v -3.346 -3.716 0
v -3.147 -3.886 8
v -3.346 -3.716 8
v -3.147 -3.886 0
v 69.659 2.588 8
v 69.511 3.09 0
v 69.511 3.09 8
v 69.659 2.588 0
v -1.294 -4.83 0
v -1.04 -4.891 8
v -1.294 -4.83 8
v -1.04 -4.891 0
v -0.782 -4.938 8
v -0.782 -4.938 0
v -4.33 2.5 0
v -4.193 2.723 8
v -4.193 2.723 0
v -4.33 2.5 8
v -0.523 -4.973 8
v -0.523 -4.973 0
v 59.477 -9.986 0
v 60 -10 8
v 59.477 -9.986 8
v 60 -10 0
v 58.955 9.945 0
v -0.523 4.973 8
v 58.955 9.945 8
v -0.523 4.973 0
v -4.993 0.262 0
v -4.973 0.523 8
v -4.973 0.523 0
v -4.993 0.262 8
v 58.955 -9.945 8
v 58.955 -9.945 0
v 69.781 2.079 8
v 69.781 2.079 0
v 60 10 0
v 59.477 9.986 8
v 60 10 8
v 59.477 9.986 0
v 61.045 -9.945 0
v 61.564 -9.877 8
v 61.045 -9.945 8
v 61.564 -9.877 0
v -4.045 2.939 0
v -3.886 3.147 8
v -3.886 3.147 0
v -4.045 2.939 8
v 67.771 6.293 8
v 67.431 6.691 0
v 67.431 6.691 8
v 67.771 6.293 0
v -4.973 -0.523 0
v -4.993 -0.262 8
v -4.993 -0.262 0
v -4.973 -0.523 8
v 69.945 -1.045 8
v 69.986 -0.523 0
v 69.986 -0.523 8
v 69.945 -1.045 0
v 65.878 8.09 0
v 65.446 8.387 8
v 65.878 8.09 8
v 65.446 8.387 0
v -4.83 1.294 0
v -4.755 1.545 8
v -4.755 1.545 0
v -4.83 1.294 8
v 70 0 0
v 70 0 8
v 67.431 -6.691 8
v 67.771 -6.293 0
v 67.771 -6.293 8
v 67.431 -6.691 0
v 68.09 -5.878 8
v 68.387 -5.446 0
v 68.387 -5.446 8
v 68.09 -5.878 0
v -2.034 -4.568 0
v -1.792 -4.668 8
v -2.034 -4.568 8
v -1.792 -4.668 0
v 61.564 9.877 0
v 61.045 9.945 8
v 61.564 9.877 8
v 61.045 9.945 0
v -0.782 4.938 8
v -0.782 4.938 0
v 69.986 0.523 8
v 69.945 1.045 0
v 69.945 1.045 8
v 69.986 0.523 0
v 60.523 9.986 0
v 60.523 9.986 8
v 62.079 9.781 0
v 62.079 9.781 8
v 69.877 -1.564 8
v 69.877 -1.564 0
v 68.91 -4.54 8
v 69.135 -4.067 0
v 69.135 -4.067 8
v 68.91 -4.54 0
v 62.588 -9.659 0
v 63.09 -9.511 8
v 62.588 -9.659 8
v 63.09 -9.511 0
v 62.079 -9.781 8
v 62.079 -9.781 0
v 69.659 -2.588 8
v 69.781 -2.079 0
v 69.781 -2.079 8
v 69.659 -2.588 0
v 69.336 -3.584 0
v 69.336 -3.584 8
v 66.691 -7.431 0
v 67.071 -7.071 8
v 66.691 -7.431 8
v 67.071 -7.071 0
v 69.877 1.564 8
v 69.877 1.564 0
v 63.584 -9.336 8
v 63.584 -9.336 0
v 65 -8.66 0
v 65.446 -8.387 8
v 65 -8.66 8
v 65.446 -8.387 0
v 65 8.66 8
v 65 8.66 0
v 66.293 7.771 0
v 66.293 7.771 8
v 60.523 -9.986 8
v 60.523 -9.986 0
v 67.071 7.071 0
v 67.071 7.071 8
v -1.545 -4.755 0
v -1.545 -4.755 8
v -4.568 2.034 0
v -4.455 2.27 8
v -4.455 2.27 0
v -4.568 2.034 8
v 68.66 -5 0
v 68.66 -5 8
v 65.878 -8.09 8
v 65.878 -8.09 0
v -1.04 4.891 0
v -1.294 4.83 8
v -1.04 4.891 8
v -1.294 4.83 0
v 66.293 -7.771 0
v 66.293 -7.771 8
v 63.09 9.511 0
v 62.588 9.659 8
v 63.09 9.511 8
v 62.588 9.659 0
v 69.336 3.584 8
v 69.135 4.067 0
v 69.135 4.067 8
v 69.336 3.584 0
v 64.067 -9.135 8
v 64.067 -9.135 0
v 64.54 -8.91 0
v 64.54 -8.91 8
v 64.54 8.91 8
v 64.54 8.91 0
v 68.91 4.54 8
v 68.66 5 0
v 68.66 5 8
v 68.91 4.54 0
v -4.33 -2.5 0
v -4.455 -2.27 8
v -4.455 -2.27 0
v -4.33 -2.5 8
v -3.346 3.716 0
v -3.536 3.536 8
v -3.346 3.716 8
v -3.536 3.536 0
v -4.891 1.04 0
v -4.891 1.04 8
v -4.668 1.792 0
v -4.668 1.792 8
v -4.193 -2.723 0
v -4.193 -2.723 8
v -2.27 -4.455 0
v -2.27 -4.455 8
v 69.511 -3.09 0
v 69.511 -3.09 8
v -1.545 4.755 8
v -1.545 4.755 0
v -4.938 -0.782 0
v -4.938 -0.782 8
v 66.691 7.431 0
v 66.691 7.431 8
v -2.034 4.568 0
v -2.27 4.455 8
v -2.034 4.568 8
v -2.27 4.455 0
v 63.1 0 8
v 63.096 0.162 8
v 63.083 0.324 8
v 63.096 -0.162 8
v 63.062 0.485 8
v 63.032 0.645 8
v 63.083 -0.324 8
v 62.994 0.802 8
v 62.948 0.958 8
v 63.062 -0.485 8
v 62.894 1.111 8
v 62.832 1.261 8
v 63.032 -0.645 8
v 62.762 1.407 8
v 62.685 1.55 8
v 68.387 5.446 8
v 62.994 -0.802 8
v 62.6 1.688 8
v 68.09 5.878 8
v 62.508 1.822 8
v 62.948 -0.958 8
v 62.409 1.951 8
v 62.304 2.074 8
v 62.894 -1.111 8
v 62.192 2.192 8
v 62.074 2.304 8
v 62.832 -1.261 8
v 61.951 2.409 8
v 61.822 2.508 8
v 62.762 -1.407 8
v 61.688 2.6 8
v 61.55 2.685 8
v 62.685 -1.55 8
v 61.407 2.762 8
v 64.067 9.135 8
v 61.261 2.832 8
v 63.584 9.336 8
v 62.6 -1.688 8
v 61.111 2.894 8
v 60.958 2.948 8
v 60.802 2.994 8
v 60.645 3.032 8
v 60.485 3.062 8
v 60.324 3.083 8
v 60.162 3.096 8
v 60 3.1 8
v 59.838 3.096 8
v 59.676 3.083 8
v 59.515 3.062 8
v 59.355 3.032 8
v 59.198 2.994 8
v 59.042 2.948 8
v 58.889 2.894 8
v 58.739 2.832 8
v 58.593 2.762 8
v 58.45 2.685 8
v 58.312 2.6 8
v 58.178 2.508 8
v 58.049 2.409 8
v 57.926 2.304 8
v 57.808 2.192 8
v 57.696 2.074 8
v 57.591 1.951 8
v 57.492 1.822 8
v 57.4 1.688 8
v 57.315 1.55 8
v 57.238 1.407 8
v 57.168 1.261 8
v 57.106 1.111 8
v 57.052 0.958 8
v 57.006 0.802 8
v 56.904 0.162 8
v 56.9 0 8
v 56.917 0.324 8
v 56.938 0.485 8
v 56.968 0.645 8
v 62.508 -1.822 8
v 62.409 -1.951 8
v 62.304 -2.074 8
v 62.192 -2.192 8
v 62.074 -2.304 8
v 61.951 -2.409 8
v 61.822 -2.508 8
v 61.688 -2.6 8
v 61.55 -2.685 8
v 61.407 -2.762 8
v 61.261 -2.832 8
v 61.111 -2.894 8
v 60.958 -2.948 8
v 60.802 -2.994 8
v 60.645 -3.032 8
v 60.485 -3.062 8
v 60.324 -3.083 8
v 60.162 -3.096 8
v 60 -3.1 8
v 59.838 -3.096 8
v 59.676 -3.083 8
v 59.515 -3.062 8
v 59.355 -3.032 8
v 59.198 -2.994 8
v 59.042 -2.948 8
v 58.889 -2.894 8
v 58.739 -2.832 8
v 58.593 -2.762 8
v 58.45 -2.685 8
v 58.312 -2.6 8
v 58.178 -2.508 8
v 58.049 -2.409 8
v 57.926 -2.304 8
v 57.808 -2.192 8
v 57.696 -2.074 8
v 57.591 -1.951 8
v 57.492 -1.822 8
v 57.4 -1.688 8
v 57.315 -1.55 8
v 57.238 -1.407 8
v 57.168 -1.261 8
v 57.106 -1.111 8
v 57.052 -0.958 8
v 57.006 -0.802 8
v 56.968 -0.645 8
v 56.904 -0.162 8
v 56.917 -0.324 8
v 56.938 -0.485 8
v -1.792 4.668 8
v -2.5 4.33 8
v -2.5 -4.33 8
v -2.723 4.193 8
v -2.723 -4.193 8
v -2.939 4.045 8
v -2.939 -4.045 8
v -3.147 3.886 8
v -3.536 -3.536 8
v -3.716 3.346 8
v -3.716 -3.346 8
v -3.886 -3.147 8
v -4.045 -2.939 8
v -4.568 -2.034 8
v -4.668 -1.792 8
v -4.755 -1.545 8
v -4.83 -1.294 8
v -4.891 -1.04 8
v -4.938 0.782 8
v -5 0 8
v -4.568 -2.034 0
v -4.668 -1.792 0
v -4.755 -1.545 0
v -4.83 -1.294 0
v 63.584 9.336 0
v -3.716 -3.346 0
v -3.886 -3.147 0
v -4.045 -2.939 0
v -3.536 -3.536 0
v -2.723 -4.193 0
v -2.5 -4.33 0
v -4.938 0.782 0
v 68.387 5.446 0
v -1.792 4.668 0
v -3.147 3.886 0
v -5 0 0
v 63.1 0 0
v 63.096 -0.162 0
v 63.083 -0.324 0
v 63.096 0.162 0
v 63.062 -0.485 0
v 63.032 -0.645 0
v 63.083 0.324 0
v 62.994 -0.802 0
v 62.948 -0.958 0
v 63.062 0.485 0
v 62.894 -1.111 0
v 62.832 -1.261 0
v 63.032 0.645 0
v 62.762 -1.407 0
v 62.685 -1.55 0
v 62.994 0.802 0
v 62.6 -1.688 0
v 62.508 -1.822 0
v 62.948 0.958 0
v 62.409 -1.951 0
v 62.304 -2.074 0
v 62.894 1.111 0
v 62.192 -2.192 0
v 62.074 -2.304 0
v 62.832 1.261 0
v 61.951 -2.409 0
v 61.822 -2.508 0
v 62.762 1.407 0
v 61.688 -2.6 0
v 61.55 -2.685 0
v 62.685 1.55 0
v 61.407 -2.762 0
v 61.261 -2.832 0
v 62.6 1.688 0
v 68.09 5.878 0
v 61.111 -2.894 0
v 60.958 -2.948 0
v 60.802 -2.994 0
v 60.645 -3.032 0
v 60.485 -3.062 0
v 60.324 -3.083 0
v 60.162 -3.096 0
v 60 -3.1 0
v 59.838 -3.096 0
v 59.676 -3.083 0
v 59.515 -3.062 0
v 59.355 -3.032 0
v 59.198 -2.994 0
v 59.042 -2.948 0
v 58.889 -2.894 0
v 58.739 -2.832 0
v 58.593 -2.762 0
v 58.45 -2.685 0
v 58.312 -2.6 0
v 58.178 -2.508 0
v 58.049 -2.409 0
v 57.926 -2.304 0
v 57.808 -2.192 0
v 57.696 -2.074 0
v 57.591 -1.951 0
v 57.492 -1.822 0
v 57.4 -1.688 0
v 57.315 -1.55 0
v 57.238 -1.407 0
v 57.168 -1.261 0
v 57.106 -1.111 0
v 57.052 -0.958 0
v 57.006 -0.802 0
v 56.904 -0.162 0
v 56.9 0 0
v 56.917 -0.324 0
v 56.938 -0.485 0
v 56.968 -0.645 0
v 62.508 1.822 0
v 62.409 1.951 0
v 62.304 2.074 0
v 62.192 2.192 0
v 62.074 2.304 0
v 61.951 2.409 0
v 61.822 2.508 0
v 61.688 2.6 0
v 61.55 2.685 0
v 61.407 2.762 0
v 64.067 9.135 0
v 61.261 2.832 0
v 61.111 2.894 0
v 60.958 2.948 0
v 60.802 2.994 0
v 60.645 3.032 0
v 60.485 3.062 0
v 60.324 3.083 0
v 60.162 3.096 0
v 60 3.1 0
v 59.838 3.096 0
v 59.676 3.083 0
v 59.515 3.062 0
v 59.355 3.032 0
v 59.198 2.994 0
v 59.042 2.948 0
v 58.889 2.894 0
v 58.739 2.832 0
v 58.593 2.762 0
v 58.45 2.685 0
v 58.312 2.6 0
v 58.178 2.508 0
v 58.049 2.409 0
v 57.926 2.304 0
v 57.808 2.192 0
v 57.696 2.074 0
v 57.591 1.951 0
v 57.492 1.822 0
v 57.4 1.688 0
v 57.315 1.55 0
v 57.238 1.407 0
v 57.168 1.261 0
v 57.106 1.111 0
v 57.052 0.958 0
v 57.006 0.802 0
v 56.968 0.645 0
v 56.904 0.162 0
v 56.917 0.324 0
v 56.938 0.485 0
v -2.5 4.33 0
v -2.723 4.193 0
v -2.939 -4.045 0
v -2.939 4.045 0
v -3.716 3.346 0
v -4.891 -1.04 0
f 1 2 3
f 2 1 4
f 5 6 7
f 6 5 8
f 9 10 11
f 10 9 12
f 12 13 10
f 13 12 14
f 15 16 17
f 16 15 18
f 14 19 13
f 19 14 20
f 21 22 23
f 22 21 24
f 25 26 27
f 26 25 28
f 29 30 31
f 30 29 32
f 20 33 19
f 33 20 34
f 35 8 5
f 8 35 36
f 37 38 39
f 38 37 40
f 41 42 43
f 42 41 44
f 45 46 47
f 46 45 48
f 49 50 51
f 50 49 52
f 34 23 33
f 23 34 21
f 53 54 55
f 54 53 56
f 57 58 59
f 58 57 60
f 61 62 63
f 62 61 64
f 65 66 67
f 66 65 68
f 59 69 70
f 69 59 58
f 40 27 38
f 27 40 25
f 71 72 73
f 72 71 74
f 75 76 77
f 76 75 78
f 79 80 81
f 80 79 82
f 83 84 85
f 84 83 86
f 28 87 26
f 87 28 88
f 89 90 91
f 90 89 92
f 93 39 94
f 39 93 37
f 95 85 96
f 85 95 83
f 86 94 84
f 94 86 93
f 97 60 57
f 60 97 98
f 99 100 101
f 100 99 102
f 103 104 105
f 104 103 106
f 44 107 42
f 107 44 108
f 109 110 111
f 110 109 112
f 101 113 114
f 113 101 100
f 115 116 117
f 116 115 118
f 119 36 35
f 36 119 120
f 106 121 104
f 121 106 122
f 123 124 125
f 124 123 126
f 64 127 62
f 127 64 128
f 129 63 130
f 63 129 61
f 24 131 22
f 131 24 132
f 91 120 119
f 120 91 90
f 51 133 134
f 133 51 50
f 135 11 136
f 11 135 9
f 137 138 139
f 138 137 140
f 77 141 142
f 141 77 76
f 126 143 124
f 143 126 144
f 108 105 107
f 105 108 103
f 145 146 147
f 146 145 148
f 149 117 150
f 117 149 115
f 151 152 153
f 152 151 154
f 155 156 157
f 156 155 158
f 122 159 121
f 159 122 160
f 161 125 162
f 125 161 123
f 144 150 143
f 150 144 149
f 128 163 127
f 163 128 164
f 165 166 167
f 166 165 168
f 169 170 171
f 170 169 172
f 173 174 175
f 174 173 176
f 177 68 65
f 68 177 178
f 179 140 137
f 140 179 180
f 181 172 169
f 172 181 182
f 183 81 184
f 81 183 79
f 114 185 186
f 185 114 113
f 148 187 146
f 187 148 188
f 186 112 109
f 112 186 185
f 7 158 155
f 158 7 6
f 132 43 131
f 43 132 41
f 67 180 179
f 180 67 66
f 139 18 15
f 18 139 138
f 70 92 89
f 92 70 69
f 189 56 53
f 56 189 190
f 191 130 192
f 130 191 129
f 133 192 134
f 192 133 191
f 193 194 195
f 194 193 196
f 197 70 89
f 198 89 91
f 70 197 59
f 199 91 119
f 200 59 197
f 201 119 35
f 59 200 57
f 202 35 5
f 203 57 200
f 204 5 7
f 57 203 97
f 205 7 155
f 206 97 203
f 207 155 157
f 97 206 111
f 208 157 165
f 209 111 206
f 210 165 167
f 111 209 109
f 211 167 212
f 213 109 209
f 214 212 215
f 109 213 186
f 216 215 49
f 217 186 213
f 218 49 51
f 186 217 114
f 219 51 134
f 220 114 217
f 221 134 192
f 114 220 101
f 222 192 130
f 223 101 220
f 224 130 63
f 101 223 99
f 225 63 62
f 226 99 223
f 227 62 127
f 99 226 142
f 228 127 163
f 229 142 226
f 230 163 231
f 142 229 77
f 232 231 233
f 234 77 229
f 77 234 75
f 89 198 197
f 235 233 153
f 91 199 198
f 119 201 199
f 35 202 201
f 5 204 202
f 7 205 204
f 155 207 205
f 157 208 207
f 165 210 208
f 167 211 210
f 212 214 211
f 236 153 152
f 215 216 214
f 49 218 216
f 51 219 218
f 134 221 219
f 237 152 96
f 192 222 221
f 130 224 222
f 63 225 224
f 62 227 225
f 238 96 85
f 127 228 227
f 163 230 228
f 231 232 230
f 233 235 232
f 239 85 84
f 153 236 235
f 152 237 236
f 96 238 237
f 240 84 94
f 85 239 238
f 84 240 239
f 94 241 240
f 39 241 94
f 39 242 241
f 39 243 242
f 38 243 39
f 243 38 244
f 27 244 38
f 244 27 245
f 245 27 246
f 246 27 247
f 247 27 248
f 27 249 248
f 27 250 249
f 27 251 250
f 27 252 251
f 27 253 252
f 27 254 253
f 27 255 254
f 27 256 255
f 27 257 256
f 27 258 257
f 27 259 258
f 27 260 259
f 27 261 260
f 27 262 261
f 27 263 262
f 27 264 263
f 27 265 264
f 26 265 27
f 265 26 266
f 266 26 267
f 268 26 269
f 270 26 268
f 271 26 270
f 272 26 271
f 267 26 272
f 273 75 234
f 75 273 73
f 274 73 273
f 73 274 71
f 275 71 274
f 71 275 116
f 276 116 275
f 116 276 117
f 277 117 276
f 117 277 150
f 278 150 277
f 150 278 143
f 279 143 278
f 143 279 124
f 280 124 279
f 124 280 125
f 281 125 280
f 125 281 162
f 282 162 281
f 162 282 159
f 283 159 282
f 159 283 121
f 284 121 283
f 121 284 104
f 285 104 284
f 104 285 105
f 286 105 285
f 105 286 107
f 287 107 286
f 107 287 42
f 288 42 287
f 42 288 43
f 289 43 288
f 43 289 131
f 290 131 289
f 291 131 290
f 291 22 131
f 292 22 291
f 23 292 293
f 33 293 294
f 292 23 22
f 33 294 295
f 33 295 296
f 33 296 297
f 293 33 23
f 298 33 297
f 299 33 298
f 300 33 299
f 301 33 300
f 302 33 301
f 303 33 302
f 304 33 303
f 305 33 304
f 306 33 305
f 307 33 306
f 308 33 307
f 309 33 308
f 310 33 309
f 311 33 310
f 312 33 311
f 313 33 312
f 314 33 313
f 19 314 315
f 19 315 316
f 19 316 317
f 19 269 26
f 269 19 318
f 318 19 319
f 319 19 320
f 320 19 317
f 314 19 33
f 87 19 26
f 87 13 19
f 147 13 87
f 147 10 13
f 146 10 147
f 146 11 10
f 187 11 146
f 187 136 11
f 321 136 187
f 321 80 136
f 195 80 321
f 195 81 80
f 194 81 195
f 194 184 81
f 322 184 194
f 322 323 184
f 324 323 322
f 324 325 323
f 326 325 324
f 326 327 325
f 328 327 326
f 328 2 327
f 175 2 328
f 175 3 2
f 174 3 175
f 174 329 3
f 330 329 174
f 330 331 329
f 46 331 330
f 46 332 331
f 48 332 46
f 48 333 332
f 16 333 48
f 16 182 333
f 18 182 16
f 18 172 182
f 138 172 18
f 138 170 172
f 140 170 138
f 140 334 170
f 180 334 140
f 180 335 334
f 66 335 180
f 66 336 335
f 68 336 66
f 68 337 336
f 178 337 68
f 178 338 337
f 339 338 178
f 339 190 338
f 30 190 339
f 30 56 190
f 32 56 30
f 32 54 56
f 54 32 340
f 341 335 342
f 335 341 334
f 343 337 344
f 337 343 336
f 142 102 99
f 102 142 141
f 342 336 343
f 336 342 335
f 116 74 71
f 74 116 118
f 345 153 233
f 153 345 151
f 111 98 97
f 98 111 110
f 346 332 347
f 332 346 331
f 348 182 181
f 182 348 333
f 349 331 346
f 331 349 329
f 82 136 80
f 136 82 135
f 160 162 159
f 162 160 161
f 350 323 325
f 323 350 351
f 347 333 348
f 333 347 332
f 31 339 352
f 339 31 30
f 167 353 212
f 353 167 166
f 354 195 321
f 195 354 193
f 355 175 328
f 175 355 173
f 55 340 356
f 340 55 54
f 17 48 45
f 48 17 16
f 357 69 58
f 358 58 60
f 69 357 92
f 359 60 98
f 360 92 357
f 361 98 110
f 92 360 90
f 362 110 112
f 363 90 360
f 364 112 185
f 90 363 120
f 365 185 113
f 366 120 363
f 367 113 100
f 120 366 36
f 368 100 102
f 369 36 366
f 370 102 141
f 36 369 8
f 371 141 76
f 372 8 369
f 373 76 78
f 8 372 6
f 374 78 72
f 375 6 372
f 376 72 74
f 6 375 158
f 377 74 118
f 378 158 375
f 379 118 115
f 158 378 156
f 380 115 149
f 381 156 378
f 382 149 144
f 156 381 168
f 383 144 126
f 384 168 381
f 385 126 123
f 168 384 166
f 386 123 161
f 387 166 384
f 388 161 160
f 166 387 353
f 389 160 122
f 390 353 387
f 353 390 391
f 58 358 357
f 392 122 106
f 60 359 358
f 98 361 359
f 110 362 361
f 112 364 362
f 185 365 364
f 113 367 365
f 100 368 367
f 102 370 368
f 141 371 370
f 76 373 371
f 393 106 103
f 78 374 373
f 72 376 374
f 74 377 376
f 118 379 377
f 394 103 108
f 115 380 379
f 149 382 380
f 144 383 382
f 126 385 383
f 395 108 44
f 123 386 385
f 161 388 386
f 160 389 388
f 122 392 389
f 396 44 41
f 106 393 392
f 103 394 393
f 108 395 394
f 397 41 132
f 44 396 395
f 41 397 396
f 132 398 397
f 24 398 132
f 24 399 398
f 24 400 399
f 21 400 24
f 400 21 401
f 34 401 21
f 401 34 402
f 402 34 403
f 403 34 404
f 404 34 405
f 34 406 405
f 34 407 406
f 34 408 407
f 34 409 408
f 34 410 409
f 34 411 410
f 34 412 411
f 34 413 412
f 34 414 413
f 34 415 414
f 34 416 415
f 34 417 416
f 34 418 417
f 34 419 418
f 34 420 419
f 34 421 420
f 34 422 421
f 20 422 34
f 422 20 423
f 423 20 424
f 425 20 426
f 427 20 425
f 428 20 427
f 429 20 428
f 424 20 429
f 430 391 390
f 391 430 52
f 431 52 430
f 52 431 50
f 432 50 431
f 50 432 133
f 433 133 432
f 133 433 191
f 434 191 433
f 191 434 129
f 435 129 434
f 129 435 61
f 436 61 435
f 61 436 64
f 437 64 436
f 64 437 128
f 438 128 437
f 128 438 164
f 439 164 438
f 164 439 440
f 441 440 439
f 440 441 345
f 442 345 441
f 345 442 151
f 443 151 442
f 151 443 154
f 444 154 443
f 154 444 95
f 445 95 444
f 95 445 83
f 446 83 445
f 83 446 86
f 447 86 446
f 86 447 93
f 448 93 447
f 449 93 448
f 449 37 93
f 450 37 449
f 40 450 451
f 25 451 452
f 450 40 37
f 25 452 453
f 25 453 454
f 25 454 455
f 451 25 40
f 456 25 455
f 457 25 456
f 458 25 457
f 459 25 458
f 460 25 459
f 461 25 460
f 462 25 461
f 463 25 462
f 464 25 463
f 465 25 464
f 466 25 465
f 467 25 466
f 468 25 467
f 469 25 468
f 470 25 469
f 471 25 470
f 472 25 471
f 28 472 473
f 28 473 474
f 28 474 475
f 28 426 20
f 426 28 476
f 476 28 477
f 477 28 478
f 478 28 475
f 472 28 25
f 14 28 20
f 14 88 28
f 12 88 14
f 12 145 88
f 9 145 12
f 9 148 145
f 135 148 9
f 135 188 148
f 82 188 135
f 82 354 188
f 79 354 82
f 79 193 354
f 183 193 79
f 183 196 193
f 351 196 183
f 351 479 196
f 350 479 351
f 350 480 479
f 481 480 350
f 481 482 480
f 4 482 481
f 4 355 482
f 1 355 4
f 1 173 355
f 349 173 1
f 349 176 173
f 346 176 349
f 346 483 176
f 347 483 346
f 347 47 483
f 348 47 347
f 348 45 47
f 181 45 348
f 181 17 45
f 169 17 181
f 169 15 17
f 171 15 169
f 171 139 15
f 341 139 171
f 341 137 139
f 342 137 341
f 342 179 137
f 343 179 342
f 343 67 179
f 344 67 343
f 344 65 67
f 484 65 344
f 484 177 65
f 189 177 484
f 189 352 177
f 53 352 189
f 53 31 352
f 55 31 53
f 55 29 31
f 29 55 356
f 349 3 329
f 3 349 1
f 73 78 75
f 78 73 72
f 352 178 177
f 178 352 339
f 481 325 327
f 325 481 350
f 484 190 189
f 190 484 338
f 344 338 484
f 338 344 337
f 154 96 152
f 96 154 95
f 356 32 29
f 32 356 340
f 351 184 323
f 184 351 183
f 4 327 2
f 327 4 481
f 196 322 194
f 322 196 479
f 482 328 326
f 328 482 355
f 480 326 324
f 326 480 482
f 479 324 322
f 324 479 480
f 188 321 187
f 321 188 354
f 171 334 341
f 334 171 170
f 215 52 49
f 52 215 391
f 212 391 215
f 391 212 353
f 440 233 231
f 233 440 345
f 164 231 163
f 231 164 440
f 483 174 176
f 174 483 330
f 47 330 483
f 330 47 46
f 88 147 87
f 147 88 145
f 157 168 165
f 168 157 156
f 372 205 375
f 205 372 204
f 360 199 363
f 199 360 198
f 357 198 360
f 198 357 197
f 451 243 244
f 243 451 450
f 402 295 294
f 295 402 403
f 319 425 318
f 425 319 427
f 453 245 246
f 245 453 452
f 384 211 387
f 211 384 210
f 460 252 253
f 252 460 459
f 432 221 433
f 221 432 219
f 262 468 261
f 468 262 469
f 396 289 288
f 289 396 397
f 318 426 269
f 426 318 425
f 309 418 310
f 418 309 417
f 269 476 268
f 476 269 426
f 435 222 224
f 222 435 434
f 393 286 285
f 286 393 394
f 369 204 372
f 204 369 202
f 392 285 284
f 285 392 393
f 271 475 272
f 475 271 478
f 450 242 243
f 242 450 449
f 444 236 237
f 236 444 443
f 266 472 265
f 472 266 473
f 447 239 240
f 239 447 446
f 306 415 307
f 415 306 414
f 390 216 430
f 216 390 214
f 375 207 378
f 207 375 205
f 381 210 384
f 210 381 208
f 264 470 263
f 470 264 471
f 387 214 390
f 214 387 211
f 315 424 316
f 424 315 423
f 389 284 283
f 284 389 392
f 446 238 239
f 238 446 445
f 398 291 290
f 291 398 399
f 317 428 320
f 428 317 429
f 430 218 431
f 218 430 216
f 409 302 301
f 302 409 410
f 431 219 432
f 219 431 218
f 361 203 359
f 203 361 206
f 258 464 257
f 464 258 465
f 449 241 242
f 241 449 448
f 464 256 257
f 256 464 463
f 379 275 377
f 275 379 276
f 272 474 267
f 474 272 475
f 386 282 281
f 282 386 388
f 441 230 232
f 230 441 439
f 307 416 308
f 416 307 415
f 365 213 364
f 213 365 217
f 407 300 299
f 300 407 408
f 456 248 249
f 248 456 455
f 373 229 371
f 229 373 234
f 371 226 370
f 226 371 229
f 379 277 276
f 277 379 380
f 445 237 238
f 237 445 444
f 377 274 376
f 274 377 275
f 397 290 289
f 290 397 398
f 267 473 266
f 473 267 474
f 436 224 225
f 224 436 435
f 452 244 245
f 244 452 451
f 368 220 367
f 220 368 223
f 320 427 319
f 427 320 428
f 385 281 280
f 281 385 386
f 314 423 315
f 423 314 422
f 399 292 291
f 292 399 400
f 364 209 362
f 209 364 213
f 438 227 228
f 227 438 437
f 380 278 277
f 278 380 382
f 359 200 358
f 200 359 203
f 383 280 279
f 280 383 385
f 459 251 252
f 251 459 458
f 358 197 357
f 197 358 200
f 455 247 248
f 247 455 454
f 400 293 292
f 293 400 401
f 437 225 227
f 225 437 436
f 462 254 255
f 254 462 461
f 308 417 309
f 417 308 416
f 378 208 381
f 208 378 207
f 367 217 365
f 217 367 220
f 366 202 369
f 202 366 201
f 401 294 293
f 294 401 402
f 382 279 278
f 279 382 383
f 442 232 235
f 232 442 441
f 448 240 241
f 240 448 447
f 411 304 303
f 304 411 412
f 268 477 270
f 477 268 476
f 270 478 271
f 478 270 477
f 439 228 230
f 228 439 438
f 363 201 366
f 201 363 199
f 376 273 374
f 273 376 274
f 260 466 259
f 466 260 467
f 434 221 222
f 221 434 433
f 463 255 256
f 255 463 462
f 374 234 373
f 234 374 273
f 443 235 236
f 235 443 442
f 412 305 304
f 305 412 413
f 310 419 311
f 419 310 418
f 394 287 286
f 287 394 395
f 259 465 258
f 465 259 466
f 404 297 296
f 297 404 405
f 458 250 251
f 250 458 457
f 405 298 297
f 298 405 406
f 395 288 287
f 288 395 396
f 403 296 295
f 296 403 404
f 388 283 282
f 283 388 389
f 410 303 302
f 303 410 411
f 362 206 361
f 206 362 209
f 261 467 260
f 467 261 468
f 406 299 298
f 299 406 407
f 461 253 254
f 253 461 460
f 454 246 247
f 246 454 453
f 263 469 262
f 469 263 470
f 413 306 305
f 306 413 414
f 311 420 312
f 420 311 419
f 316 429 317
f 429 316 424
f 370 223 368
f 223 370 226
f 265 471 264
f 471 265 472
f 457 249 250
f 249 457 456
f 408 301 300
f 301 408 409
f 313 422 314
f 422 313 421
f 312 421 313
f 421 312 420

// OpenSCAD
// file: config.scad
drawReferences = false;
drawReferenceWall = false;

outerWidth = 1500;
outerDepth = 700;
outerHeight = 700;

profileSize = 40;

fireBasketHeight = 250;
fireBasketWidth = 400;
fireBasketGroundClearance = 100;
fireBasketFrontOpen = true;

spindleDiameter  = 20;
spindleOverlength = 5;
spindleWallExtension = 140;
spindleWheelDiameter = 200;
spindlePlateThickness = 5;
spindlePlateGap = 2;
spindleHandleThickness = 8;

grateGap = 4;
grateSize = 30;
grateProfileThickness = 3;

lineThickness = 1;
lineGap = 80;
textSize = 20;

$fn = 120;
// main file
include <./config.scad>
include <./spindlePlate.scad>


color([200/255, 200/255, 100/255])
lock();
